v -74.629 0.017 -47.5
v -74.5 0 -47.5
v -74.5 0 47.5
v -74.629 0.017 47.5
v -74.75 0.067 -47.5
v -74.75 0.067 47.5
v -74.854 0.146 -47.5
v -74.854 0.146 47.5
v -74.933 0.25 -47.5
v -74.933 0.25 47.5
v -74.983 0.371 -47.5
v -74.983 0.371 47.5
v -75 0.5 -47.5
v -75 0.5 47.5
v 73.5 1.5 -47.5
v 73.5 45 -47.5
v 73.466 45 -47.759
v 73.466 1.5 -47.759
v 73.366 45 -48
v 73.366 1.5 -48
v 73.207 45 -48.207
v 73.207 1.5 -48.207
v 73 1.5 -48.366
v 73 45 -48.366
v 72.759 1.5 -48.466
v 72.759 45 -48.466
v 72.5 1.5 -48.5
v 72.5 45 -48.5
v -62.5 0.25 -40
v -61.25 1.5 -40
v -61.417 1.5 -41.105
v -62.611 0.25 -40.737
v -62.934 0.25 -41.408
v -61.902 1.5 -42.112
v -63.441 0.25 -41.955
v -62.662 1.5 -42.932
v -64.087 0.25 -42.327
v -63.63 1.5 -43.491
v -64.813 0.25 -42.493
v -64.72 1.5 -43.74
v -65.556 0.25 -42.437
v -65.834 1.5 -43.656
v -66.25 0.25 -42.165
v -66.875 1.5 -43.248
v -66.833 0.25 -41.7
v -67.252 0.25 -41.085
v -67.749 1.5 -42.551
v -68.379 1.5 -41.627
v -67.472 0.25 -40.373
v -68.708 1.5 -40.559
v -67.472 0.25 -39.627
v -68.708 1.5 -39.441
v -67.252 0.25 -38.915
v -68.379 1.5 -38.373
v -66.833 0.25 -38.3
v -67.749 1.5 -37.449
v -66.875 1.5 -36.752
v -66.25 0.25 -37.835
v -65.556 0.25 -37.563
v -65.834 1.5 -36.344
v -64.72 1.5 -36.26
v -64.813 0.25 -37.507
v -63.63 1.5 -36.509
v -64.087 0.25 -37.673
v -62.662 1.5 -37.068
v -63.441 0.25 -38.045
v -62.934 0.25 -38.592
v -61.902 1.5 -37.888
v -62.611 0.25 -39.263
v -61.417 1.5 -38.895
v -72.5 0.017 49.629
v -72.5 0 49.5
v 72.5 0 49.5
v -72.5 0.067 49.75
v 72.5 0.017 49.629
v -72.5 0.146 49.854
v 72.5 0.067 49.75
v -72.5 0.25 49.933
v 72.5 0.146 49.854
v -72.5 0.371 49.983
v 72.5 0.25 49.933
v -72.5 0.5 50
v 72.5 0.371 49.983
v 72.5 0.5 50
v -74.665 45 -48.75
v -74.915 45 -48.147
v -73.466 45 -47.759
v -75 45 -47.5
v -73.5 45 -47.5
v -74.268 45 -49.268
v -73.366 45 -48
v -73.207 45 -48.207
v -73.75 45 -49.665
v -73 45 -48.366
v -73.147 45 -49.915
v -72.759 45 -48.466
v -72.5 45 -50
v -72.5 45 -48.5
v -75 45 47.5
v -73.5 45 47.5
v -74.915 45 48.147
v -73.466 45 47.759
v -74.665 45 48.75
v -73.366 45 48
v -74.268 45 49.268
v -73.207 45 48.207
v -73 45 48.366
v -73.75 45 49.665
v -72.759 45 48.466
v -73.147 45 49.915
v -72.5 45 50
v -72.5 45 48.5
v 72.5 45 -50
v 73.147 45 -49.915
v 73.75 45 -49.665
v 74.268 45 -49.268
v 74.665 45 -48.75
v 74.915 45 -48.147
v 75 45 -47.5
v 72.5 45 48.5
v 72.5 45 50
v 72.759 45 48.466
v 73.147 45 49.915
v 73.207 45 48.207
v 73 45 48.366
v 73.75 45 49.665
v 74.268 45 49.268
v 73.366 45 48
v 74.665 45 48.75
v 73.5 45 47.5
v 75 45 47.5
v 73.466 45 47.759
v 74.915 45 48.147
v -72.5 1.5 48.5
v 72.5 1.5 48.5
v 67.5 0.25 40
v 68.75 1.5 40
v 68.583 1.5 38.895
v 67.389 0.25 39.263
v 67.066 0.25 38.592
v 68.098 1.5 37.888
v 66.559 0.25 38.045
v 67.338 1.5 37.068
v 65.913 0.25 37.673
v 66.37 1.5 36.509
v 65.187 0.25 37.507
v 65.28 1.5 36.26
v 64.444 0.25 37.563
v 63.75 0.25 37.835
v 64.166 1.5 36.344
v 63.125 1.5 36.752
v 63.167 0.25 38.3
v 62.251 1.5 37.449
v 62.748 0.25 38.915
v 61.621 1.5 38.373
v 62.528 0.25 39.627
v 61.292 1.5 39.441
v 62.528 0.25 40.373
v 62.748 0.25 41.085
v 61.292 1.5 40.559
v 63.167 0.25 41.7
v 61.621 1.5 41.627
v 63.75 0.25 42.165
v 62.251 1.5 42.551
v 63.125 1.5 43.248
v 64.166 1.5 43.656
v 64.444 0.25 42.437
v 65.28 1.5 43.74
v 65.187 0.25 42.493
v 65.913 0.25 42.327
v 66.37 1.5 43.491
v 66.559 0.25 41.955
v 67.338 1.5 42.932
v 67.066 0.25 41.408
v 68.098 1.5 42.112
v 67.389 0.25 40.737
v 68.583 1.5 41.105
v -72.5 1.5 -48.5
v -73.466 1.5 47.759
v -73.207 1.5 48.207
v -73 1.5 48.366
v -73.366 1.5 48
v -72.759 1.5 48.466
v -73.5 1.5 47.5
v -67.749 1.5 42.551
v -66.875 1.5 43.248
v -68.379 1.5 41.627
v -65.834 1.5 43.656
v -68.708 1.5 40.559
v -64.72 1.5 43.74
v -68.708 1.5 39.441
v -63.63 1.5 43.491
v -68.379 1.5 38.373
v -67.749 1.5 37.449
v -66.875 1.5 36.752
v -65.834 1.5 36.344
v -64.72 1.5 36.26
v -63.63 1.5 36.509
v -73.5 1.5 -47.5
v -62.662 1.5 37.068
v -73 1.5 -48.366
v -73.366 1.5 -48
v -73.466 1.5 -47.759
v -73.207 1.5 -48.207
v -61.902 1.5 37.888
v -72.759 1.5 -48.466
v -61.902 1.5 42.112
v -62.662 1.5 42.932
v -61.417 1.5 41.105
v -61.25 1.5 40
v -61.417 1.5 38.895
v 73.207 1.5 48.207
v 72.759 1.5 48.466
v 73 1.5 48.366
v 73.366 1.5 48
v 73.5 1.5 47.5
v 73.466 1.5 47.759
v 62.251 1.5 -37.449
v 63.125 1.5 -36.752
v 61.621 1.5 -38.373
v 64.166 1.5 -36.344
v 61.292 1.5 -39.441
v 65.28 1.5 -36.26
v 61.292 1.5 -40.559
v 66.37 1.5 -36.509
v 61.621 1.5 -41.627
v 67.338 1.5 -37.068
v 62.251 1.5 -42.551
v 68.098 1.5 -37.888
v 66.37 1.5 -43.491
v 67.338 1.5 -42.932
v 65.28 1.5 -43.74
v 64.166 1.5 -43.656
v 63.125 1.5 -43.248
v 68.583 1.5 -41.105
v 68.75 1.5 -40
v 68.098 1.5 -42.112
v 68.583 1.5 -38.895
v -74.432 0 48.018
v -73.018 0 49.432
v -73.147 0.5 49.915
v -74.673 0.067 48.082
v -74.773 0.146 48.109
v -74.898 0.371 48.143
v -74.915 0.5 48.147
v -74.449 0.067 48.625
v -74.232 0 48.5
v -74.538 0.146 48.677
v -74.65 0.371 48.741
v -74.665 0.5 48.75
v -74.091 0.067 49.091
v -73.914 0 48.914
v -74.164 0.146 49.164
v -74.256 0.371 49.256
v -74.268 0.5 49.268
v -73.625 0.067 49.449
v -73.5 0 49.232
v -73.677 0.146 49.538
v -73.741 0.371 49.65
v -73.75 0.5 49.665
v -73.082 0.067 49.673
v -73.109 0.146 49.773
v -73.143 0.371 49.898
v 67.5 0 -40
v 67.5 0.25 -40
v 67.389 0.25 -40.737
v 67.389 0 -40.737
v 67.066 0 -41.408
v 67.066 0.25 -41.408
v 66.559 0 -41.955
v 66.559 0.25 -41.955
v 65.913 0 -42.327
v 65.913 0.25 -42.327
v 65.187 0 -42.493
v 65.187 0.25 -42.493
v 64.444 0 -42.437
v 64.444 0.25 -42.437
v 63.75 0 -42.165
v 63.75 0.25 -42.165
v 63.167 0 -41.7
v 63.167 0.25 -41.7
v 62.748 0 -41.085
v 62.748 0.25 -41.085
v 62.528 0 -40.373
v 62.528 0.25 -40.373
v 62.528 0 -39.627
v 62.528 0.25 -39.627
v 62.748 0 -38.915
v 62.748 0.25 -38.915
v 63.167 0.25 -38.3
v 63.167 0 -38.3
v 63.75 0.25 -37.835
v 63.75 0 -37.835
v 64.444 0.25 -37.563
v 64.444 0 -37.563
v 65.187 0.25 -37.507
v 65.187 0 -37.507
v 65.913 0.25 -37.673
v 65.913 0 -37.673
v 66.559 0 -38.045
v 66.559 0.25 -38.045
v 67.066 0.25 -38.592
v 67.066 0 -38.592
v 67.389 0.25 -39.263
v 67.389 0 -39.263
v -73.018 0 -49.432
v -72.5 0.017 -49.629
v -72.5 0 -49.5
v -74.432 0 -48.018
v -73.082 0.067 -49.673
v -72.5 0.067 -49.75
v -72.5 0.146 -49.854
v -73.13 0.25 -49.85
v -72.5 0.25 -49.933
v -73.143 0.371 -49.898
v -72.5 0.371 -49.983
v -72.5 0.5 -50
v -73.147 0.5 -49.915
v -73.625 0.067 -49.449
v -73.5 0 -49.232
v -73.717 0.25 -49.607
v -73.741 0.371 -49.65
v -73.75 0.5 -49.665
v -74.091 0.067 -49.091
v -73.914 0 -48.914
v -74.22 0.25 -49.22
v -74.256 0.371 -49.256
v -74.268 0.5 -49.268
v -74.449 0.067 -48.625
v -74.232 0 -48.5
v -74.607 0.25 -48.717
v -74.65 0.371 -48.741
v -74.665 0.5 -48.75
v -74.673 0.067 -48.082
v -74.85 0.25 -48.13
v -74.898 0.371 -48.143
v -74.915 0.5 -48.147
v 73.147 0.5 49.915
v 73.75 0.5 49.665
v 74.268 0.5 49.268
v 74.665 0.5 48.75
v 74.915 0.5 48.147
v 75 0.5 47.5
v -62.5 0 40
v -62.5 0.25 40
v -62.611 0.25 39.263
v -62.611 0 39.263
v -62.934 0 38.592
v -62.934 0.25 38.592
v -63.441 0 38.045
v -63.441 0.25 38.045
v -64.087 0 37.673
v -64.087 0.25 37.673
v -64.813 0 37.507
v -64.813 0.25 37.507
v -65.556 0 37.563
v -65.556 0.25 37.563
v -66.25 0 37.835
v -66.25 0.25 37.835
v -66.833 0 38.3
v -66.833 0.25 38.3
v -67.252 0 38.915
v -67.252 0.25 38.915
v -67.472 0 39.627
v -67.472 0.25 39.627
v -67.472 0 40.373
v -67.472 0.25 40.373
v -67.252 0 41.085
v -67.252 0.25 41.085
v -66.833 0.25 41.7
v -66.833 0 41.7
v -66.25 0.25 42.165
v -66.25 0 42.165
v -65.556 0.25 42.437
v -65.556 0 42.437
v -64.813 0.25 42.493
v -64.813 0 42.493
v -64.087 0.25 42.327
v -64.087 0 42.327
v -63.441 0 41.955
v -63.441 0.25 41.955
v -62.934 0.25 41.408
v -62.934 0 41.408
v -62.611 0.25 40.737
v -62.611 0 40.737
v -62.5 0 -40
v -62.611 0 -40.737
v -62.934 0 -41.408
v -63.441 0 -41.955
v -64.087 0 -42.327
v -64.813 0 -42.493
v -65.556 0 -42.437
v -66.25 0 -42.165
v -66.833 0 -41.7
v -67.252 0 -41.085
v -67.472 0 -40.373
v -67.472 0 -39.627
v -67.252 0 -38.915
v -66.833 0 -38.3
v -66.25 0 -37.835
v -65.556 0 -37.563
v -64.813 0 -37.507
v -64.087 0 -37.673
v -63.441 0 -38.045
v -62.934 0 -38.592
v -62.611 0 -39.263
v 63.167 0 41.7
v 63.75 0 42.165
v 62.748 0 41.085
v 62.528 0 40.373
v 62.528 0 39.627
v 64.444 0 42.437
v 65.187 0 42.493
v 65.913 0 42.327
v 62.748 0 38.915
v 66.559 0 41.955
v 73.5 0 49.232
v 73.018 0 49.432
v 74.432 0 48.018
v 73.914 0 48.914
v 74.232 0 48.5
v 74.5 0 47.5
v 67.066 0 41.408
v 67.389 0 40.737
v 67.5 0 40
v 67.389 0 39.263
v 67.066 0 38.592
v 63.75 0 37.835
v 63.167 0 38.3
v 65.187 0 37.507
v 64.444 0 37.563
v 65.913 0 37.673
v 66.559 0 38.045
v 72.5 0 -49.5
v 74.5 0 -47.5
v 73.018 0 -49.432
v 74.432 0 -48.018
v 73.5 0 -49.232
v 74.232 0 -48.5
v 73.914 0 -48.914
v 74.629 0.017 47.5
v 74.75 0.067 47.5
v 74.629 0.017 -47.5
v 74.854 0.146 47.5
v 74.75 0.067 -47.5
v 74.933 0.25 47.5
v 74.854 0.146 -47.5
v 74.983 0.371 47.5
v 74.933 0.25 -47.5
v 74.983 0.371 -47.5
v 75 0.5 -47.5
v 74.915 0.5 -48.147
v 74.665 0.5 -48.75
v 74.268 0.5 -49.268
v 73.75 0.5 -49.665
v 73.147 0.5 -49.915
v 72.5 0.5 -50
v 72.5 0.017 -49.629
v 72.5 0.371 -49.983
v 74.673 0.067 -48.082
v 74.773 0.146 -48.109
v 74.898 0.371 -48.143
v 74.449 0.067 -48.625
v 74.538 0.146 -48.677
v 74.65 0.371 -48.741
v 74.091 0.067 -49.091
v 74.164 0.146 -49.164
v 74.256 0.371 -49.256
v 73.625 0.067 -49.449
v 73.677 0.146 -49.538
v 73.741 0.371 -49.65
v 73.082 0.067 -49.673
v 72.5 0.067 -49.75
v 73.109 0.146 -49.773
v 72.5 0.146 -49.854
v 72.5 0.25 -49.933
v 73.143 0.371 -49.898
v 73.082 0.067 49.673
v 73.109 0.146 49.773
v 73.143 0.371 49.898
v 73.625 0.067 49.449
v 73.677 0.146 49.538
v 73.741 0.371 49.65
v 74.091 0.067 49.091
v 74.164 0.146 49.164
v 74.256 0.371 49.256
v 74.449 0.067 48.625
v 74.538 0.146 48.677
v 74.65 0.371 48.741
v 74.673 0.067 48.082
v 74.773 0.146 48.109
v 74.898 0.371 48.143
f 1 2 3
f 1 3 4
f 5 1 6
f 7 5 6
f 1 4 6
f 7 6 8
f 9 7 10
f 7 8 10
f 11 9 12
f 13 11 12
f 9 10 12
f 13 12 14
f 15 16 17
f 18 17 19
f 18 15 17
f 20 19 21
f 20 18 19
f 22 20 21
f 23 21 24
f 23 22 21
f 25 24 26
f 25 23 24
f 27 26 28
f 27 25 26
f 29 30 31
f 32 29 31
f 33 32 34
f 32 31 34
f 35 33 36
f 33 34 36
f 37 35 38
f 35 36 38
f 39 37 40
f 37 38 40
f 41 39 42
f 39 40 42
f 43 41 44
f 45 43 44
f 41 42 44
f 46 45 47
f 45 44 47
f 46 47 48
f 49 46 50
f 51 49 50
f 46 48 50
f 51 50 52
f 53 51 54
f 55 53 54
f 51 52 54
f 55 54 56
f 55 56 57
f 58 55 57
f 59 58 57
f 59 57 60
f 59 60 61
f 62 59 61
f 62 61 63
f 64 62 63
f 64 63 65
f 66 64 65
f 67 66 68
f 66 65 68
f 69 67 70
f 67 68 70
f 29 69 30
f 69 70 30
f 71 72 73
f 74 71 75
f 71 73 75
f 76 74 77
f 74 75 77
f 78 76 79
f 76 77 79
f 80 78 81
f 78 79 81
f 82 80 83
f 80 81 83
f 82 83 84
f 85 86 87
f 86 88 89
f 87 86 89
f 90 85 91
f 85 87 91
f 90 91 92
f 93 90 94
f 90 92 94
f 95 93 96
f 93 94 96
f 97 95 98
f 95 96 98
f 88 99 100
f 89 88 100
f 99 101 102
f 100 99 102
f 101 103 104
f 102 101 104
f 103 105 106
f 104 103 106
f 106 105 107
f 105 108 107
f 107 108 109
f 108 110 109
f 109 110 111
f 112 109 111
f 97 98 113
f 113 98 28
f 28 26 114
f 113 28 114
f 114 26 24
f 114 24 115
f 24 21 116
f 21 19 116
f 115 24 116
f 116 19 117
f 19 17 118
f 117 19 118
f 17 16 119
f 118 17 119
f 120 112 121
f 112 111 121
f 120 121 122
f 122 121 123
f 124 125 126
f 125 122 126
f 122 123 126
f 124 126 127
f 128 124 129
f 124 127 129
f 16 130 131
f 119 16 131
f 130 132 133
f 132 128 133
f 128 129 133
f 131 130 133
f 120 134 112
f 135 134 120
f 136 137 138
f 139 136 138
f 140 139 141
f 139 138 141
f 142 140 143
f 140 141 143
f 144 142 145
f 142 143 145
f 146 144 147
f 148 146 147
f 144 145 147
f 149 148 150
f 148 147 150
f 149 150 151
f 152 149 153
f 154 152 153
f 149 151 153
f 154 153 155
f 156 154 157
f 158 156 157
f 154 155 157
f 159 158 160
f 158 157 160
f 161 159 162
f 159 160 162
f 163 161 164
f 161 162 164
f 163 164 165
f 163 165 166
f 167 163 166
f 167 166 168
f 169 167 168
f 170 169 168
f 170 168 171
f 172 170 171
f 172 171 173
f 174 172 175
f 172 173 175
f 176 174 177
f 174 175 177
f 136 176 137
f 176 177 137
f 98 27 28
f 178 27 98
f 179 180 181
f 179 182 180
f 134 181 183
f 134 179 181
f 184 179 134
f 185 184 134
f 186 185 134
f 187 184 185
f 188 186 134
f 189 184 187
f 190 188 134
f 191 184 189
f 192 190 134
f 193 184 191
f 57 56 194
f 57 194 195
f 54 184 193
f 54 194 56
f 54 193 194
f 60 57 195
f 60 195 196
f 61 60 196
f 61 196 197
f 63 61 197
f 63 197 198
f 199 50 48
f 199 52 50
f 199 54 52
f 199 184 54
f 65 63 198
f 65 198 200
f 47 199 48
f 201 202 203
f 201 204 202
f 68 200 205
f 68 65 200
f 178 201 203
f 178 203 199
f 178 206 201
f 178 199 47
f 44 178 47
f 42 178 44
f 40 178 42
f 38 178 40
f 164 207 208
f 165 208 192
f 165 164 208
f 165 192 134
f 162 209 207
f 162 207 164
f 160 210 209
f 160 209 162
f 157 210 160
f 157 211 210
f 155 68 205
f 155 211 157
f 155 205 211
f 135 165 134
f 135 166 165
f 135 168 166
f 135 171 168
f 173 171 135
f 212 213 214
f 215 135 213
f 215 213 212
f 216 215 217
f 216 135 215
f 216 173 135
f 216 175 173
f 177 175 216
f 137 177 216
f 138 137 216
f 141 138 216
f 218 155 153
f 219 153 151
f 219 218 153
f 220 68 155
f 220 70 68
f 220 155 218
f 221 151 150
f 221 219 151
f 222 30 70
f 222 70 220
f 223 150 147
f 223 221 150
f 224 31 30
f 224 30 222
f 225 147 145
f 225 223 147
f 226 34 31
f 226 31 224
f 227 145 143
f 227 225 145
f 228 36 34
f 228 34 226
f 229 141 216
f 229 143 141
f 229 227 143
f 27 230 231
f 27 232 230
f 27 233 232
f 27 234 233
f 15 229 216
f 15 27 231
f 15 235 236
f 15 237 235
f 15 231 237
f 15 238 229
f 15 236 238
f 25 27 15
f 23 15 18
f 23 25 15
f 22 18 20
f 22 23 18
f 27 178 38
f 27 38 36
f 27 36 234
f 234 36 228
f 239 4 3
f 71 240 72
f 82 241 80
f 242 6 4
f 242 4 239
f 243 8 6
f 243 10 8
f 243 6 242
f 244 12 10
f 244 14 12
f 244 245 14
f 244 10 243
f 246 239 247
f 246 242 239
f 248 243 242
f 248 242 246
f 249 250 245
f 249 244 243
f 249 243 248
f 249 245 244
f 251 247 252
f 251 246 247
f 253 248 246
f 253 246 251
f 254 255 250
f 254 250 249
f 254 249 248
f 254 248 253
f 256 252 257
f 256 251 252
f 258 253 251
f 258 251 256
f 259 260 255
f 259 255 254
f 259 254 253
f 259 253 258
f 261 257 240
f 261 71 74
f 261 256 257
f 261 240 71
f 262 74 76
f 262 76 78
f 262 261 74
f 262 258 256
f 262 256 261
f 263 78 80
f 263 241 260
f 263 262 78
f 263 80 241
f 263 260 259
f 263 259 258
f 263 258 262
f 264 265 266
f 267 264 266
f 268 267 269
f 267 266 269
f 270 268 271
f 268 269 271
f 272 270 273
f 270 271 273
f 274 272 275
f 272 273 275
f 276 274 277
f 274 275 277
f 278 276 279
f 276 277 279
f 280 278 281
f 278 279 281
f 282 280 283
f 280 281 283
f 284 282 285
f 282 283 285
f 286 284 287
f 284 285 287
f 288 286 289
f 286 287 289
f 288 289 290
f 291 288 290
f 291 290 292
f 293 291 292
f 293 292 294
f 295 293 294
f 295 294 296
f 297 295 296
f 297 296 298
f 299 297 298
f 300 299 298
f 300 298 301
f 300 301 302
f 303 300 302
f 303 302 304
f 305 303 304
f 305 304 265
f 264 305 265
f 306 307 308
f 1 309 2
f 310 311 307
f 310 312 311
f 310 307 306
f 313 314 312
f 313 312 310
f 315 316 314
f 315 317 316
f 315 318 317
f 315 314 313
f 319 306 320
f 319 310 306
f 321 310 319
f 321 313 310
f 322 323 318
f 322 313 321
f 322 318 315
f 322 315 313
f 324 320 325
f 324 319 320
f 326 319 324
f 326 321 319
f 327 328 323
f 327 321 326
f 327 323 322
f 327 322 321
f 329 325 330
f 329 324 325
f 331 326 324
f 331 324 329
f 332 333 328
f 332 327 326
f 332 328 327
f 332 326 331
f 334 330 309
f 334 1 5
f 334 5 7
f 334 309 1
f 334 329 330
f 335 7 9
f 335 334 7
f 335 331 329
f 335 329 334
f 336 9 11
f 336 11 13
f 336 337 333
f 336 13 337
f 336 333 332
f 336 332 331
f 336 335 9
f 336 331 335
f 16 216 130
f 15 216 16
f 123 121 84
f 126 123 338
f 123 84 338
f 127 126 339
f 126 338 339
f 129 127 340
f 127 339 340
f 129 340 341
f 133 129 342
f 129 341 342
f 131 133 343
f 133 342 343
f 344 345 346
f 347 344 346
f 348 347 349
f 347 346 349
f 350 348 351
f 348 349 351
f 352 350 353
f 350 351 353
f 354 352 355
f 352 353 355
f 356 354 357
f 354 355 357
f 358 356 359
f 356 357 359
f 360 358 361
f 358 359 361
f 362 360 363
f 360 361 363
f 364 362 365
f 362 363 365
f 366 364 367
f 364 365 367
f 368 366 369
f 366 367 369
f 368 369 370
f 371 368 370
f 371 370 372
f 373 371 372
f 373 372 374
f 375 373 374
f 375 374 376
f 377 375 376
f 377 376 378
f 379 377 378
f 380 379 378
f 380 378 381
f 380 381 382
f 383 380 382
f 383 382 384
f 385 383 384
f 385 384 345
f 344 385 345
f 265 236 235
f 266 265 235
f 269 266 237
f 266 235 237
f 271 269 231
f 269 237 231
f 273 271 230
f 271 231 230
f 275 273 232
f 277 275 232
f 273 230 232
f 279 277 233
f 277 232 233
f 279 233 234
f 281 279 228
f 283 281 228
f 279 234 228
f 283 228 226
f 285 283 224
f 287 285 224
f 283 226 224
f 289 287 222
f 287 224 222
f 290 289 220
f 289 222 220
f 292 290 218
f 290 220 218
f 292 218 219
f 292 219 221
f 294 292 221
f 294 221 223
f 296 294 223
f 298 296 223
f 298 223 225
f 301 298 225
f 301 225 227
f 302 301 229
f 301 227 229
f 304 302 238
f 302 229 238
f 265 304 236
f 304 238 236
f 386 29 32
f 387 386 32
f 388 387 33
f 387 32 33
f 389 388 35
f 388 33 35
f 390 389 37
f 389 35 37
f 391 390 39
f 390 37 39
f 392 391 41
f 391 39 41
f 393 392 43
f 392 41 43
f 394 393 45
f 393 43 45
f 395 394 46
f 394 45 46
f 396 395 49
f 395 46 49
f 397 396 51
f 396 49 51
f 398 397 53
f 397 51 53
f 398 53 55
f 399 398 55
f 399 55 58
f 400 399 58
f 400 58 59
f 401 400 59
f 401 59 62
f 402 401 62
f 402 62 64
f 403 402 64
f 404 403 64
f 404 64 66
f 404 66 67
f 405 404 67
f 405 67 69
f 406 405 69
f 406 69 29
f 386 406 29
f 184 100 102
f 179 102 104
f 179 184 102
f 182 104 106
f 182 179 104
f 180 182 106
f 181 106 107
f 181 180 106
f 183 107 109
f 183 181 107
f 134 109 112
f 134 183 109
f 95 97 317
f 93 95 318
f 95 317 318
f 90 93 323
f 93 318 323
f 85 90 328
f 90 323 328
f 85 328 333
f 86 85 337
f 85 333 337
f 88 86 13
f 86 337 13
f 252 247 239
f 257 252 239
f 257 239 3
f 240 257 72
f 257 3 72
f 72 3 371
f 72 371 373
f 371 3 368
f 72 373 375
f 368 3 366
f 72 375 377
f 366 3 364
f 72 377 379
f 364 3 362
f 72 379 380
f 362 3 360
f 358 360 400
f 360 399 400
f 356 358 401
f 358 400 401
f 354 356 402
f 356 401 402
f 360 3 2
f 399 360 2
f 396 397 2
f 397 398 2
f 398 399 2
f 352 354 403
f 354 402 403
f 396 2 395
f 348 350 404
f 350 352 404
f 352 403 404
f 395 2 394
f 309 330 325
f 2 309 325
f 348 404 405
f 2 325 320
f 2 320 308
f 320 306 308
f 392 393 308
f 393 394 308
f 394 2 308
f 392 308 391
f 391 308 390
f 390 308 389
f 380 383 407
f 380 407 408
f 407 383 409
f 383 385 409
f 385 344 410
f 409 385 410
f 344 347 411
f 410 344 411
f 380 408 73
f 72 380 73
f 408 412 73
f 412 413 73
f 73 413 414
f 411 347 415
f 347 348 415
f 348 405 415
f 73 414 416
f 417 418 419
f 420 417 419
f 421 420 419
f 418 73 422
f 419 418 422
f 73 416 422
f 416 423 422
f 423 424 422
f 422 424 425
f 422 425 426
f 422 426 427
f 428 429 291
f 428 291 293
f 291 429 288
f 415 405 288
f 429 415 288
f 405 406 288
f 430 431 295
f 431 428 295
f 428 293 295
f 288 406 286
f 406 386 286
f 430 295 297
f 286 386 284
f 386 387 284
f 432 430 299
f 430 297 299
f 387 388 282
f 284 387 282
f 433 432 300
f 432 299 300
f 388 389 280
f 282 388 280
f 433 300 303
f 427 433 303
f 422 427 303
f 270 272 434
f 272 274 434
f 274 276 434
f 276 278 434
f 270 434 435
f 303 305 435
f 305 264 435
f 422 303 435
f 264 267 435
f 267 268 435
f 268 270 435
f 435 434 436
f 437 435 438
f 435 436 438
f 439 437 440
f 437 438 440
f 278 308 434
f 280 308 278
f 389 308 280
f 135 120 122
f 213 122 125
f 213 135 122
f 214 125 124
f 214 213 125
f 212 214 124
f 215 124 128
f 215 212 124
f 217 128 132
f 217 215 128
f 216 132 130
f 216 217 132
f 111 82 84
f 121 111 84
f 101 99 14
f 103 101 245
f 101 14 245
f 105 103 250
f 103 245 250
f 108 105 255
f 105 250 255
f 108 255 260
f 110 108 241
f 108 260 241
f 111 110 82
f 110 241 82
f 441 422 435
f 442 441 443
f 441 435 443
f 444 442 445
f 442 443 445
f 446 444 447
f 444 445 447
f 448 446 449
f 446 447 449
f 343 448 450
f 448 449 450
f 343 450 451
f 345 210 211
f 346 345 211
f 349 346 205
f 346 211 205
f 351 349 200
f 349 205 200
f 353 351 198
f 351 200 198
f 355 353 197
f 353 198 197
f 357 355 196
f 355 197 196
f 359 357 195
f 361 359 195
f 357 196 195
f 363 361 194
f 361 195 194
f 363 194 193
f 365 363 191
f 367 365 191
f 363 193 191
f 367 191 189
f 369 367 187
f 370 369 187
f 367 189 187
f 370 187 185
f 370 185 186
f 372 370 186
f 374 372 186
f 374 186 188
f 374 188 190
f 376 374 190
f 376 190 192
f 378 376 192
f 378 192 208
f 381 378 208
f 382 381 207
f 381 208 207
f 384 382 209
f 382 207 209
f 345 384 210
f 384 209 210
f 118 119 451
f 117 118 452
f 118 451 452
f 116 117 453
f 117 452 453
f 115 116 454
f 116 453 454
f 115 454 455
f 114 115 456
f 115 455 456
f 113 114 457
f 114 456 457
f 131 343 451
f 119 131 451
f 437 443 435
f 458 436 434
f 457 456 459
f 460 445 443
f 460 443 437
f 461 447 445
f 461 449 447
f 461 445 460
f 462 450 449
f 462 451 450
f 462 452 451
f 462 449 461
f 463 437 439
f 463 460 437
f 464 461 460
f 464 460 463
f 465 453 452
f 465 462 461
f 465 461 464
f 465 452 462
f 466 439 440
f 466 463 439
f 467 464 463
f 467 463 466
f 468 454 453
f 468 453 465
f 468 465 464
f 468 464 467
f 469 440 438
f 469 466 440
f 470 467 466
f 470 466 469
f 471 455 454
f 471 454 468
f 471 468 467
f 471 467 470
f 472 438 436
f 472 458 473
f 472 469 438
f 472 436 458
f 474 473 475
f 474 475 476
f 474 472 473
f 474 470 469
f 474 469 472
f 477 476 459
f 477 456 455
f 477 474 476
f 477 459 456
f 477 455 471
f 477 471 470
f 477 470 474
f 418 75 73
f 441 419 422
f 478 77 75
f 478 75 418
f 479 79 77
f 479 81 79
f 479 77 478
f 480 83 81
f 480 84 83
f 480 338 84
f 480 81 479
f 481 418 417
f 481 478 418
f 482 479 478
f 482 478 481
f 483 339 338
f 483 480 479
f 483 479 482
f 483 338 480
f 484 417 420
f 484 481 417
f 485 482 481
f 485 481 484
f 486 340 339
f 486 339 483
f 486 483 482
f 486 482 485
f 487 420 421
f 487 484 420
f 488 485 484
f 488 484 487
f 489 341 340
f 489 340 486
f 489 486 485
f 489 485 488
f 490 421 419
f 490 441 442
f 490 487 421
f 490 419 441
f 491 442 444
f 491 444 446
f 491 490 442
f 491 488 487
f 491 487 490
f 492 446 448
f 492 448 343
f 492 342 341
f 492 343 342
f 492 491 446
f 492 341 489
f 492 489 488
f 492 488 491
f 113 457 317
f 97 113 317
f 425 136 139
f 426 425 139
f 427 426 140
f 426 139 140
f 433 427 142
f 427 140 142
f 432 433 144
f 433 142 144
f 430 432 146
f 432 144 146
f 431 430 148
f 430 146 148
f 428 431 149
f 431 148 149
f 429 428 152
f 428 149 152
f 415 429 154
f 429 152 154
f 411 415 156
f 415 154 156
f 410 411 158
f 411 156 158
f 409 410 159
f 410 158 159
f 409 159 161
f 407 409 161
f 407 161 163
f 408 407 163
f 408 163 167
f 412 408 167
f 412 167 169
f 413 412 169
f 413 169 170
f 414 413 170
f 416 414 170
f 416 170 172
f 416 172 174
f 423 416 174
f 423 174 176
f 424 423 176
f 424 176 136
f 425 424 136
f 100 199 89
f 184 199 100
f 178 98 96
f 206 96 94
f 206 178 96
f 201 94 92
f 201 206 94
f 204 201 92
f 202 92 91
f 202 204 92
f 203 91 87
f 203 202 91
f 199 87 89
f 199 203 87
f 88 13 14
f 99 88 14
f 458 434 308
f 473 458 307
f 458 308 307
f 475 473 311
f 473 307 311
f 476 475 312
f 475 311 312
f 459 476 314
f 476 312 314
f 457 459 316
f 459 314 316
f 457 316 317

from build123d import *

# Parameters (mm, degrees)
BOSS_EXTRUDE1_DEPTH = 50
SHELL1_T            = -1.5
SKETCH2_R           = 2.5
CUT_EXTRUDE1_DEPTH  = 50
SKETCH3_OUTSIDE_W   = 189.504
SKETCH3_OUTSIDE_H   = 139.504
CUT_EXTRUDE2_DEPTH  = 5
CUT_EXTRUDE2_TAPER  = 0.5
FILLET1_R           = 0.5
CHAMFER1_SIZE       = 1.25


with BuildPart() as part:
    # Sketch1 → Boss-Extrude1 (new body)
    with BuildSketch(Plane(origin=(0, 0, 0), x_dir=(1, 0, 0), z_dir=(0, 1, 0))):
        with BuildLine():
            Line((-72.5, -50), (72.5, -50))
            ThreePointArc((72.5, -50), (74.267766953, -49.267766953), (75, -47.5))
            Line((75, -47.5), (75, 47.5))
            ThreePointArc((75, 47.5), (74.267766953, 49.267766953), (72.5, 50))
            Line((72.5, 50), (-72.5, 50))
            ThreePointArc((-72.5, 50), (-74.267766953, 49.267766953), (-75, 47.5))
            Line((-75, 47.5), (-75, -47.5))
            ThreePointArc((-75, -47.5), (-74.267766953, -49.267766953), (-72.5, -50))
        make_face()
    extrude(amount=BOSS_EXTRUDE1_DEPTH)

    # Shell1
    shell1_openings = [part.faces().sort_by_distance(p)[0] for p in [
        (0, 50, 0),
    ]]
    offset(amount=SHELL1_T, openings=shell1_openings, kind=Kind.INTERSECTION)

    # Sketch2 → Cut-Extrude1 (cut)
    with BuildSketch(Plane(origin=(0, 1.5, 0), x_dir=(1, 0, 0), z_dir=(0, 1, 0))):
        with Locations((-65, 40)):
            Circle(SKETCH2_R)
        with Locations((65, 40)):
            Circle(SKETCH2_R)
        with Locations((65, -40)):
            Circle(SKETCH2_R)
        with Locations((-65, -40)):
            Circle(SKETCH2_R)
    extrude(amount=-CUT_EXTRUDE1_DEPTH, mode=Mode.SUBTRACT)

    # Sketch3 outside → Cut-Extrude2 (cut)
    with BuildSketch(Plane(origin=(0, 50, 0), x_dir=(1, 0, 0), z_dir=(0, 1, 0))):
        Rectangle(SKETCH3_OUTSIDE_W, SKETCH3_OUTSIDE_H)
        with BuildLine():
            Line((-69.232233047, -45.732233047), (69.232233047, -45.732233047))
            ThreePointArc((69.232233047, -45.732233047), (70.292893219, -45.292893219), (70.732233047, -44.232233047))
            Line((70.732233047, -44.232233047), (70.732233047, 44.232233047))
            ThreePointArc((70.732233047, 44.232233047), (70.292893219, 45.292893219), (69.232233047, 45.732233047))
            Line((69.232233047, 45.732233047), (-69.232233047, 45.732233047))
            ThreePointArc((-69.232233047, 45.732233047), (-70.292893219, 45.292893219), (-70.732233047, 44.232233047))
            Line((-70.732233047, 44.232233047), (-70.732233047, -44.232233047))
            ThreePointArc((-70.732233047, -44.232233047), (-70.292893219, -45.292893219), (-69.232233047, -45.732233047))
        make_face(mode=Mode.SUBTRACT)
    extrude(amount=-CUT_EXTRUDE2_DEPTH, taper=CUT_EXTRUDE2_TAPER, mode=Mode.SUBTRACT)

    # Fillet1
    fillet1_edges = [part.edges().sort_by_distance(p)[0] for p in [
        (-75, 0, 0),
        (-74.267766953, 0, -49.267766953),
        (0, 0, -50),
        (74.267766953, 0, -49.267766953),
        (75, 0, 0),
        (74.267766953, 0, 49.267766953),
        (0, 0, 50),
        (-74.267766953, 0, 49.267766953),
    ]]
    fillet(fillet1_edges, radius=FILLET1_R)

    # Chamfer1
    chamfer1_edges = [part.edges().sort_by_distance(p)[0] for p in [
        (-67.5, 1.5, -40),
        (62.5, 1.5, -40),
        (62.5, 1.5, 40),
        (-67.5, 1.5, 40),
    ]]
    chamfer(chamfer1_edges, length=CHAMFER1_SIZE)


solid = part.part
